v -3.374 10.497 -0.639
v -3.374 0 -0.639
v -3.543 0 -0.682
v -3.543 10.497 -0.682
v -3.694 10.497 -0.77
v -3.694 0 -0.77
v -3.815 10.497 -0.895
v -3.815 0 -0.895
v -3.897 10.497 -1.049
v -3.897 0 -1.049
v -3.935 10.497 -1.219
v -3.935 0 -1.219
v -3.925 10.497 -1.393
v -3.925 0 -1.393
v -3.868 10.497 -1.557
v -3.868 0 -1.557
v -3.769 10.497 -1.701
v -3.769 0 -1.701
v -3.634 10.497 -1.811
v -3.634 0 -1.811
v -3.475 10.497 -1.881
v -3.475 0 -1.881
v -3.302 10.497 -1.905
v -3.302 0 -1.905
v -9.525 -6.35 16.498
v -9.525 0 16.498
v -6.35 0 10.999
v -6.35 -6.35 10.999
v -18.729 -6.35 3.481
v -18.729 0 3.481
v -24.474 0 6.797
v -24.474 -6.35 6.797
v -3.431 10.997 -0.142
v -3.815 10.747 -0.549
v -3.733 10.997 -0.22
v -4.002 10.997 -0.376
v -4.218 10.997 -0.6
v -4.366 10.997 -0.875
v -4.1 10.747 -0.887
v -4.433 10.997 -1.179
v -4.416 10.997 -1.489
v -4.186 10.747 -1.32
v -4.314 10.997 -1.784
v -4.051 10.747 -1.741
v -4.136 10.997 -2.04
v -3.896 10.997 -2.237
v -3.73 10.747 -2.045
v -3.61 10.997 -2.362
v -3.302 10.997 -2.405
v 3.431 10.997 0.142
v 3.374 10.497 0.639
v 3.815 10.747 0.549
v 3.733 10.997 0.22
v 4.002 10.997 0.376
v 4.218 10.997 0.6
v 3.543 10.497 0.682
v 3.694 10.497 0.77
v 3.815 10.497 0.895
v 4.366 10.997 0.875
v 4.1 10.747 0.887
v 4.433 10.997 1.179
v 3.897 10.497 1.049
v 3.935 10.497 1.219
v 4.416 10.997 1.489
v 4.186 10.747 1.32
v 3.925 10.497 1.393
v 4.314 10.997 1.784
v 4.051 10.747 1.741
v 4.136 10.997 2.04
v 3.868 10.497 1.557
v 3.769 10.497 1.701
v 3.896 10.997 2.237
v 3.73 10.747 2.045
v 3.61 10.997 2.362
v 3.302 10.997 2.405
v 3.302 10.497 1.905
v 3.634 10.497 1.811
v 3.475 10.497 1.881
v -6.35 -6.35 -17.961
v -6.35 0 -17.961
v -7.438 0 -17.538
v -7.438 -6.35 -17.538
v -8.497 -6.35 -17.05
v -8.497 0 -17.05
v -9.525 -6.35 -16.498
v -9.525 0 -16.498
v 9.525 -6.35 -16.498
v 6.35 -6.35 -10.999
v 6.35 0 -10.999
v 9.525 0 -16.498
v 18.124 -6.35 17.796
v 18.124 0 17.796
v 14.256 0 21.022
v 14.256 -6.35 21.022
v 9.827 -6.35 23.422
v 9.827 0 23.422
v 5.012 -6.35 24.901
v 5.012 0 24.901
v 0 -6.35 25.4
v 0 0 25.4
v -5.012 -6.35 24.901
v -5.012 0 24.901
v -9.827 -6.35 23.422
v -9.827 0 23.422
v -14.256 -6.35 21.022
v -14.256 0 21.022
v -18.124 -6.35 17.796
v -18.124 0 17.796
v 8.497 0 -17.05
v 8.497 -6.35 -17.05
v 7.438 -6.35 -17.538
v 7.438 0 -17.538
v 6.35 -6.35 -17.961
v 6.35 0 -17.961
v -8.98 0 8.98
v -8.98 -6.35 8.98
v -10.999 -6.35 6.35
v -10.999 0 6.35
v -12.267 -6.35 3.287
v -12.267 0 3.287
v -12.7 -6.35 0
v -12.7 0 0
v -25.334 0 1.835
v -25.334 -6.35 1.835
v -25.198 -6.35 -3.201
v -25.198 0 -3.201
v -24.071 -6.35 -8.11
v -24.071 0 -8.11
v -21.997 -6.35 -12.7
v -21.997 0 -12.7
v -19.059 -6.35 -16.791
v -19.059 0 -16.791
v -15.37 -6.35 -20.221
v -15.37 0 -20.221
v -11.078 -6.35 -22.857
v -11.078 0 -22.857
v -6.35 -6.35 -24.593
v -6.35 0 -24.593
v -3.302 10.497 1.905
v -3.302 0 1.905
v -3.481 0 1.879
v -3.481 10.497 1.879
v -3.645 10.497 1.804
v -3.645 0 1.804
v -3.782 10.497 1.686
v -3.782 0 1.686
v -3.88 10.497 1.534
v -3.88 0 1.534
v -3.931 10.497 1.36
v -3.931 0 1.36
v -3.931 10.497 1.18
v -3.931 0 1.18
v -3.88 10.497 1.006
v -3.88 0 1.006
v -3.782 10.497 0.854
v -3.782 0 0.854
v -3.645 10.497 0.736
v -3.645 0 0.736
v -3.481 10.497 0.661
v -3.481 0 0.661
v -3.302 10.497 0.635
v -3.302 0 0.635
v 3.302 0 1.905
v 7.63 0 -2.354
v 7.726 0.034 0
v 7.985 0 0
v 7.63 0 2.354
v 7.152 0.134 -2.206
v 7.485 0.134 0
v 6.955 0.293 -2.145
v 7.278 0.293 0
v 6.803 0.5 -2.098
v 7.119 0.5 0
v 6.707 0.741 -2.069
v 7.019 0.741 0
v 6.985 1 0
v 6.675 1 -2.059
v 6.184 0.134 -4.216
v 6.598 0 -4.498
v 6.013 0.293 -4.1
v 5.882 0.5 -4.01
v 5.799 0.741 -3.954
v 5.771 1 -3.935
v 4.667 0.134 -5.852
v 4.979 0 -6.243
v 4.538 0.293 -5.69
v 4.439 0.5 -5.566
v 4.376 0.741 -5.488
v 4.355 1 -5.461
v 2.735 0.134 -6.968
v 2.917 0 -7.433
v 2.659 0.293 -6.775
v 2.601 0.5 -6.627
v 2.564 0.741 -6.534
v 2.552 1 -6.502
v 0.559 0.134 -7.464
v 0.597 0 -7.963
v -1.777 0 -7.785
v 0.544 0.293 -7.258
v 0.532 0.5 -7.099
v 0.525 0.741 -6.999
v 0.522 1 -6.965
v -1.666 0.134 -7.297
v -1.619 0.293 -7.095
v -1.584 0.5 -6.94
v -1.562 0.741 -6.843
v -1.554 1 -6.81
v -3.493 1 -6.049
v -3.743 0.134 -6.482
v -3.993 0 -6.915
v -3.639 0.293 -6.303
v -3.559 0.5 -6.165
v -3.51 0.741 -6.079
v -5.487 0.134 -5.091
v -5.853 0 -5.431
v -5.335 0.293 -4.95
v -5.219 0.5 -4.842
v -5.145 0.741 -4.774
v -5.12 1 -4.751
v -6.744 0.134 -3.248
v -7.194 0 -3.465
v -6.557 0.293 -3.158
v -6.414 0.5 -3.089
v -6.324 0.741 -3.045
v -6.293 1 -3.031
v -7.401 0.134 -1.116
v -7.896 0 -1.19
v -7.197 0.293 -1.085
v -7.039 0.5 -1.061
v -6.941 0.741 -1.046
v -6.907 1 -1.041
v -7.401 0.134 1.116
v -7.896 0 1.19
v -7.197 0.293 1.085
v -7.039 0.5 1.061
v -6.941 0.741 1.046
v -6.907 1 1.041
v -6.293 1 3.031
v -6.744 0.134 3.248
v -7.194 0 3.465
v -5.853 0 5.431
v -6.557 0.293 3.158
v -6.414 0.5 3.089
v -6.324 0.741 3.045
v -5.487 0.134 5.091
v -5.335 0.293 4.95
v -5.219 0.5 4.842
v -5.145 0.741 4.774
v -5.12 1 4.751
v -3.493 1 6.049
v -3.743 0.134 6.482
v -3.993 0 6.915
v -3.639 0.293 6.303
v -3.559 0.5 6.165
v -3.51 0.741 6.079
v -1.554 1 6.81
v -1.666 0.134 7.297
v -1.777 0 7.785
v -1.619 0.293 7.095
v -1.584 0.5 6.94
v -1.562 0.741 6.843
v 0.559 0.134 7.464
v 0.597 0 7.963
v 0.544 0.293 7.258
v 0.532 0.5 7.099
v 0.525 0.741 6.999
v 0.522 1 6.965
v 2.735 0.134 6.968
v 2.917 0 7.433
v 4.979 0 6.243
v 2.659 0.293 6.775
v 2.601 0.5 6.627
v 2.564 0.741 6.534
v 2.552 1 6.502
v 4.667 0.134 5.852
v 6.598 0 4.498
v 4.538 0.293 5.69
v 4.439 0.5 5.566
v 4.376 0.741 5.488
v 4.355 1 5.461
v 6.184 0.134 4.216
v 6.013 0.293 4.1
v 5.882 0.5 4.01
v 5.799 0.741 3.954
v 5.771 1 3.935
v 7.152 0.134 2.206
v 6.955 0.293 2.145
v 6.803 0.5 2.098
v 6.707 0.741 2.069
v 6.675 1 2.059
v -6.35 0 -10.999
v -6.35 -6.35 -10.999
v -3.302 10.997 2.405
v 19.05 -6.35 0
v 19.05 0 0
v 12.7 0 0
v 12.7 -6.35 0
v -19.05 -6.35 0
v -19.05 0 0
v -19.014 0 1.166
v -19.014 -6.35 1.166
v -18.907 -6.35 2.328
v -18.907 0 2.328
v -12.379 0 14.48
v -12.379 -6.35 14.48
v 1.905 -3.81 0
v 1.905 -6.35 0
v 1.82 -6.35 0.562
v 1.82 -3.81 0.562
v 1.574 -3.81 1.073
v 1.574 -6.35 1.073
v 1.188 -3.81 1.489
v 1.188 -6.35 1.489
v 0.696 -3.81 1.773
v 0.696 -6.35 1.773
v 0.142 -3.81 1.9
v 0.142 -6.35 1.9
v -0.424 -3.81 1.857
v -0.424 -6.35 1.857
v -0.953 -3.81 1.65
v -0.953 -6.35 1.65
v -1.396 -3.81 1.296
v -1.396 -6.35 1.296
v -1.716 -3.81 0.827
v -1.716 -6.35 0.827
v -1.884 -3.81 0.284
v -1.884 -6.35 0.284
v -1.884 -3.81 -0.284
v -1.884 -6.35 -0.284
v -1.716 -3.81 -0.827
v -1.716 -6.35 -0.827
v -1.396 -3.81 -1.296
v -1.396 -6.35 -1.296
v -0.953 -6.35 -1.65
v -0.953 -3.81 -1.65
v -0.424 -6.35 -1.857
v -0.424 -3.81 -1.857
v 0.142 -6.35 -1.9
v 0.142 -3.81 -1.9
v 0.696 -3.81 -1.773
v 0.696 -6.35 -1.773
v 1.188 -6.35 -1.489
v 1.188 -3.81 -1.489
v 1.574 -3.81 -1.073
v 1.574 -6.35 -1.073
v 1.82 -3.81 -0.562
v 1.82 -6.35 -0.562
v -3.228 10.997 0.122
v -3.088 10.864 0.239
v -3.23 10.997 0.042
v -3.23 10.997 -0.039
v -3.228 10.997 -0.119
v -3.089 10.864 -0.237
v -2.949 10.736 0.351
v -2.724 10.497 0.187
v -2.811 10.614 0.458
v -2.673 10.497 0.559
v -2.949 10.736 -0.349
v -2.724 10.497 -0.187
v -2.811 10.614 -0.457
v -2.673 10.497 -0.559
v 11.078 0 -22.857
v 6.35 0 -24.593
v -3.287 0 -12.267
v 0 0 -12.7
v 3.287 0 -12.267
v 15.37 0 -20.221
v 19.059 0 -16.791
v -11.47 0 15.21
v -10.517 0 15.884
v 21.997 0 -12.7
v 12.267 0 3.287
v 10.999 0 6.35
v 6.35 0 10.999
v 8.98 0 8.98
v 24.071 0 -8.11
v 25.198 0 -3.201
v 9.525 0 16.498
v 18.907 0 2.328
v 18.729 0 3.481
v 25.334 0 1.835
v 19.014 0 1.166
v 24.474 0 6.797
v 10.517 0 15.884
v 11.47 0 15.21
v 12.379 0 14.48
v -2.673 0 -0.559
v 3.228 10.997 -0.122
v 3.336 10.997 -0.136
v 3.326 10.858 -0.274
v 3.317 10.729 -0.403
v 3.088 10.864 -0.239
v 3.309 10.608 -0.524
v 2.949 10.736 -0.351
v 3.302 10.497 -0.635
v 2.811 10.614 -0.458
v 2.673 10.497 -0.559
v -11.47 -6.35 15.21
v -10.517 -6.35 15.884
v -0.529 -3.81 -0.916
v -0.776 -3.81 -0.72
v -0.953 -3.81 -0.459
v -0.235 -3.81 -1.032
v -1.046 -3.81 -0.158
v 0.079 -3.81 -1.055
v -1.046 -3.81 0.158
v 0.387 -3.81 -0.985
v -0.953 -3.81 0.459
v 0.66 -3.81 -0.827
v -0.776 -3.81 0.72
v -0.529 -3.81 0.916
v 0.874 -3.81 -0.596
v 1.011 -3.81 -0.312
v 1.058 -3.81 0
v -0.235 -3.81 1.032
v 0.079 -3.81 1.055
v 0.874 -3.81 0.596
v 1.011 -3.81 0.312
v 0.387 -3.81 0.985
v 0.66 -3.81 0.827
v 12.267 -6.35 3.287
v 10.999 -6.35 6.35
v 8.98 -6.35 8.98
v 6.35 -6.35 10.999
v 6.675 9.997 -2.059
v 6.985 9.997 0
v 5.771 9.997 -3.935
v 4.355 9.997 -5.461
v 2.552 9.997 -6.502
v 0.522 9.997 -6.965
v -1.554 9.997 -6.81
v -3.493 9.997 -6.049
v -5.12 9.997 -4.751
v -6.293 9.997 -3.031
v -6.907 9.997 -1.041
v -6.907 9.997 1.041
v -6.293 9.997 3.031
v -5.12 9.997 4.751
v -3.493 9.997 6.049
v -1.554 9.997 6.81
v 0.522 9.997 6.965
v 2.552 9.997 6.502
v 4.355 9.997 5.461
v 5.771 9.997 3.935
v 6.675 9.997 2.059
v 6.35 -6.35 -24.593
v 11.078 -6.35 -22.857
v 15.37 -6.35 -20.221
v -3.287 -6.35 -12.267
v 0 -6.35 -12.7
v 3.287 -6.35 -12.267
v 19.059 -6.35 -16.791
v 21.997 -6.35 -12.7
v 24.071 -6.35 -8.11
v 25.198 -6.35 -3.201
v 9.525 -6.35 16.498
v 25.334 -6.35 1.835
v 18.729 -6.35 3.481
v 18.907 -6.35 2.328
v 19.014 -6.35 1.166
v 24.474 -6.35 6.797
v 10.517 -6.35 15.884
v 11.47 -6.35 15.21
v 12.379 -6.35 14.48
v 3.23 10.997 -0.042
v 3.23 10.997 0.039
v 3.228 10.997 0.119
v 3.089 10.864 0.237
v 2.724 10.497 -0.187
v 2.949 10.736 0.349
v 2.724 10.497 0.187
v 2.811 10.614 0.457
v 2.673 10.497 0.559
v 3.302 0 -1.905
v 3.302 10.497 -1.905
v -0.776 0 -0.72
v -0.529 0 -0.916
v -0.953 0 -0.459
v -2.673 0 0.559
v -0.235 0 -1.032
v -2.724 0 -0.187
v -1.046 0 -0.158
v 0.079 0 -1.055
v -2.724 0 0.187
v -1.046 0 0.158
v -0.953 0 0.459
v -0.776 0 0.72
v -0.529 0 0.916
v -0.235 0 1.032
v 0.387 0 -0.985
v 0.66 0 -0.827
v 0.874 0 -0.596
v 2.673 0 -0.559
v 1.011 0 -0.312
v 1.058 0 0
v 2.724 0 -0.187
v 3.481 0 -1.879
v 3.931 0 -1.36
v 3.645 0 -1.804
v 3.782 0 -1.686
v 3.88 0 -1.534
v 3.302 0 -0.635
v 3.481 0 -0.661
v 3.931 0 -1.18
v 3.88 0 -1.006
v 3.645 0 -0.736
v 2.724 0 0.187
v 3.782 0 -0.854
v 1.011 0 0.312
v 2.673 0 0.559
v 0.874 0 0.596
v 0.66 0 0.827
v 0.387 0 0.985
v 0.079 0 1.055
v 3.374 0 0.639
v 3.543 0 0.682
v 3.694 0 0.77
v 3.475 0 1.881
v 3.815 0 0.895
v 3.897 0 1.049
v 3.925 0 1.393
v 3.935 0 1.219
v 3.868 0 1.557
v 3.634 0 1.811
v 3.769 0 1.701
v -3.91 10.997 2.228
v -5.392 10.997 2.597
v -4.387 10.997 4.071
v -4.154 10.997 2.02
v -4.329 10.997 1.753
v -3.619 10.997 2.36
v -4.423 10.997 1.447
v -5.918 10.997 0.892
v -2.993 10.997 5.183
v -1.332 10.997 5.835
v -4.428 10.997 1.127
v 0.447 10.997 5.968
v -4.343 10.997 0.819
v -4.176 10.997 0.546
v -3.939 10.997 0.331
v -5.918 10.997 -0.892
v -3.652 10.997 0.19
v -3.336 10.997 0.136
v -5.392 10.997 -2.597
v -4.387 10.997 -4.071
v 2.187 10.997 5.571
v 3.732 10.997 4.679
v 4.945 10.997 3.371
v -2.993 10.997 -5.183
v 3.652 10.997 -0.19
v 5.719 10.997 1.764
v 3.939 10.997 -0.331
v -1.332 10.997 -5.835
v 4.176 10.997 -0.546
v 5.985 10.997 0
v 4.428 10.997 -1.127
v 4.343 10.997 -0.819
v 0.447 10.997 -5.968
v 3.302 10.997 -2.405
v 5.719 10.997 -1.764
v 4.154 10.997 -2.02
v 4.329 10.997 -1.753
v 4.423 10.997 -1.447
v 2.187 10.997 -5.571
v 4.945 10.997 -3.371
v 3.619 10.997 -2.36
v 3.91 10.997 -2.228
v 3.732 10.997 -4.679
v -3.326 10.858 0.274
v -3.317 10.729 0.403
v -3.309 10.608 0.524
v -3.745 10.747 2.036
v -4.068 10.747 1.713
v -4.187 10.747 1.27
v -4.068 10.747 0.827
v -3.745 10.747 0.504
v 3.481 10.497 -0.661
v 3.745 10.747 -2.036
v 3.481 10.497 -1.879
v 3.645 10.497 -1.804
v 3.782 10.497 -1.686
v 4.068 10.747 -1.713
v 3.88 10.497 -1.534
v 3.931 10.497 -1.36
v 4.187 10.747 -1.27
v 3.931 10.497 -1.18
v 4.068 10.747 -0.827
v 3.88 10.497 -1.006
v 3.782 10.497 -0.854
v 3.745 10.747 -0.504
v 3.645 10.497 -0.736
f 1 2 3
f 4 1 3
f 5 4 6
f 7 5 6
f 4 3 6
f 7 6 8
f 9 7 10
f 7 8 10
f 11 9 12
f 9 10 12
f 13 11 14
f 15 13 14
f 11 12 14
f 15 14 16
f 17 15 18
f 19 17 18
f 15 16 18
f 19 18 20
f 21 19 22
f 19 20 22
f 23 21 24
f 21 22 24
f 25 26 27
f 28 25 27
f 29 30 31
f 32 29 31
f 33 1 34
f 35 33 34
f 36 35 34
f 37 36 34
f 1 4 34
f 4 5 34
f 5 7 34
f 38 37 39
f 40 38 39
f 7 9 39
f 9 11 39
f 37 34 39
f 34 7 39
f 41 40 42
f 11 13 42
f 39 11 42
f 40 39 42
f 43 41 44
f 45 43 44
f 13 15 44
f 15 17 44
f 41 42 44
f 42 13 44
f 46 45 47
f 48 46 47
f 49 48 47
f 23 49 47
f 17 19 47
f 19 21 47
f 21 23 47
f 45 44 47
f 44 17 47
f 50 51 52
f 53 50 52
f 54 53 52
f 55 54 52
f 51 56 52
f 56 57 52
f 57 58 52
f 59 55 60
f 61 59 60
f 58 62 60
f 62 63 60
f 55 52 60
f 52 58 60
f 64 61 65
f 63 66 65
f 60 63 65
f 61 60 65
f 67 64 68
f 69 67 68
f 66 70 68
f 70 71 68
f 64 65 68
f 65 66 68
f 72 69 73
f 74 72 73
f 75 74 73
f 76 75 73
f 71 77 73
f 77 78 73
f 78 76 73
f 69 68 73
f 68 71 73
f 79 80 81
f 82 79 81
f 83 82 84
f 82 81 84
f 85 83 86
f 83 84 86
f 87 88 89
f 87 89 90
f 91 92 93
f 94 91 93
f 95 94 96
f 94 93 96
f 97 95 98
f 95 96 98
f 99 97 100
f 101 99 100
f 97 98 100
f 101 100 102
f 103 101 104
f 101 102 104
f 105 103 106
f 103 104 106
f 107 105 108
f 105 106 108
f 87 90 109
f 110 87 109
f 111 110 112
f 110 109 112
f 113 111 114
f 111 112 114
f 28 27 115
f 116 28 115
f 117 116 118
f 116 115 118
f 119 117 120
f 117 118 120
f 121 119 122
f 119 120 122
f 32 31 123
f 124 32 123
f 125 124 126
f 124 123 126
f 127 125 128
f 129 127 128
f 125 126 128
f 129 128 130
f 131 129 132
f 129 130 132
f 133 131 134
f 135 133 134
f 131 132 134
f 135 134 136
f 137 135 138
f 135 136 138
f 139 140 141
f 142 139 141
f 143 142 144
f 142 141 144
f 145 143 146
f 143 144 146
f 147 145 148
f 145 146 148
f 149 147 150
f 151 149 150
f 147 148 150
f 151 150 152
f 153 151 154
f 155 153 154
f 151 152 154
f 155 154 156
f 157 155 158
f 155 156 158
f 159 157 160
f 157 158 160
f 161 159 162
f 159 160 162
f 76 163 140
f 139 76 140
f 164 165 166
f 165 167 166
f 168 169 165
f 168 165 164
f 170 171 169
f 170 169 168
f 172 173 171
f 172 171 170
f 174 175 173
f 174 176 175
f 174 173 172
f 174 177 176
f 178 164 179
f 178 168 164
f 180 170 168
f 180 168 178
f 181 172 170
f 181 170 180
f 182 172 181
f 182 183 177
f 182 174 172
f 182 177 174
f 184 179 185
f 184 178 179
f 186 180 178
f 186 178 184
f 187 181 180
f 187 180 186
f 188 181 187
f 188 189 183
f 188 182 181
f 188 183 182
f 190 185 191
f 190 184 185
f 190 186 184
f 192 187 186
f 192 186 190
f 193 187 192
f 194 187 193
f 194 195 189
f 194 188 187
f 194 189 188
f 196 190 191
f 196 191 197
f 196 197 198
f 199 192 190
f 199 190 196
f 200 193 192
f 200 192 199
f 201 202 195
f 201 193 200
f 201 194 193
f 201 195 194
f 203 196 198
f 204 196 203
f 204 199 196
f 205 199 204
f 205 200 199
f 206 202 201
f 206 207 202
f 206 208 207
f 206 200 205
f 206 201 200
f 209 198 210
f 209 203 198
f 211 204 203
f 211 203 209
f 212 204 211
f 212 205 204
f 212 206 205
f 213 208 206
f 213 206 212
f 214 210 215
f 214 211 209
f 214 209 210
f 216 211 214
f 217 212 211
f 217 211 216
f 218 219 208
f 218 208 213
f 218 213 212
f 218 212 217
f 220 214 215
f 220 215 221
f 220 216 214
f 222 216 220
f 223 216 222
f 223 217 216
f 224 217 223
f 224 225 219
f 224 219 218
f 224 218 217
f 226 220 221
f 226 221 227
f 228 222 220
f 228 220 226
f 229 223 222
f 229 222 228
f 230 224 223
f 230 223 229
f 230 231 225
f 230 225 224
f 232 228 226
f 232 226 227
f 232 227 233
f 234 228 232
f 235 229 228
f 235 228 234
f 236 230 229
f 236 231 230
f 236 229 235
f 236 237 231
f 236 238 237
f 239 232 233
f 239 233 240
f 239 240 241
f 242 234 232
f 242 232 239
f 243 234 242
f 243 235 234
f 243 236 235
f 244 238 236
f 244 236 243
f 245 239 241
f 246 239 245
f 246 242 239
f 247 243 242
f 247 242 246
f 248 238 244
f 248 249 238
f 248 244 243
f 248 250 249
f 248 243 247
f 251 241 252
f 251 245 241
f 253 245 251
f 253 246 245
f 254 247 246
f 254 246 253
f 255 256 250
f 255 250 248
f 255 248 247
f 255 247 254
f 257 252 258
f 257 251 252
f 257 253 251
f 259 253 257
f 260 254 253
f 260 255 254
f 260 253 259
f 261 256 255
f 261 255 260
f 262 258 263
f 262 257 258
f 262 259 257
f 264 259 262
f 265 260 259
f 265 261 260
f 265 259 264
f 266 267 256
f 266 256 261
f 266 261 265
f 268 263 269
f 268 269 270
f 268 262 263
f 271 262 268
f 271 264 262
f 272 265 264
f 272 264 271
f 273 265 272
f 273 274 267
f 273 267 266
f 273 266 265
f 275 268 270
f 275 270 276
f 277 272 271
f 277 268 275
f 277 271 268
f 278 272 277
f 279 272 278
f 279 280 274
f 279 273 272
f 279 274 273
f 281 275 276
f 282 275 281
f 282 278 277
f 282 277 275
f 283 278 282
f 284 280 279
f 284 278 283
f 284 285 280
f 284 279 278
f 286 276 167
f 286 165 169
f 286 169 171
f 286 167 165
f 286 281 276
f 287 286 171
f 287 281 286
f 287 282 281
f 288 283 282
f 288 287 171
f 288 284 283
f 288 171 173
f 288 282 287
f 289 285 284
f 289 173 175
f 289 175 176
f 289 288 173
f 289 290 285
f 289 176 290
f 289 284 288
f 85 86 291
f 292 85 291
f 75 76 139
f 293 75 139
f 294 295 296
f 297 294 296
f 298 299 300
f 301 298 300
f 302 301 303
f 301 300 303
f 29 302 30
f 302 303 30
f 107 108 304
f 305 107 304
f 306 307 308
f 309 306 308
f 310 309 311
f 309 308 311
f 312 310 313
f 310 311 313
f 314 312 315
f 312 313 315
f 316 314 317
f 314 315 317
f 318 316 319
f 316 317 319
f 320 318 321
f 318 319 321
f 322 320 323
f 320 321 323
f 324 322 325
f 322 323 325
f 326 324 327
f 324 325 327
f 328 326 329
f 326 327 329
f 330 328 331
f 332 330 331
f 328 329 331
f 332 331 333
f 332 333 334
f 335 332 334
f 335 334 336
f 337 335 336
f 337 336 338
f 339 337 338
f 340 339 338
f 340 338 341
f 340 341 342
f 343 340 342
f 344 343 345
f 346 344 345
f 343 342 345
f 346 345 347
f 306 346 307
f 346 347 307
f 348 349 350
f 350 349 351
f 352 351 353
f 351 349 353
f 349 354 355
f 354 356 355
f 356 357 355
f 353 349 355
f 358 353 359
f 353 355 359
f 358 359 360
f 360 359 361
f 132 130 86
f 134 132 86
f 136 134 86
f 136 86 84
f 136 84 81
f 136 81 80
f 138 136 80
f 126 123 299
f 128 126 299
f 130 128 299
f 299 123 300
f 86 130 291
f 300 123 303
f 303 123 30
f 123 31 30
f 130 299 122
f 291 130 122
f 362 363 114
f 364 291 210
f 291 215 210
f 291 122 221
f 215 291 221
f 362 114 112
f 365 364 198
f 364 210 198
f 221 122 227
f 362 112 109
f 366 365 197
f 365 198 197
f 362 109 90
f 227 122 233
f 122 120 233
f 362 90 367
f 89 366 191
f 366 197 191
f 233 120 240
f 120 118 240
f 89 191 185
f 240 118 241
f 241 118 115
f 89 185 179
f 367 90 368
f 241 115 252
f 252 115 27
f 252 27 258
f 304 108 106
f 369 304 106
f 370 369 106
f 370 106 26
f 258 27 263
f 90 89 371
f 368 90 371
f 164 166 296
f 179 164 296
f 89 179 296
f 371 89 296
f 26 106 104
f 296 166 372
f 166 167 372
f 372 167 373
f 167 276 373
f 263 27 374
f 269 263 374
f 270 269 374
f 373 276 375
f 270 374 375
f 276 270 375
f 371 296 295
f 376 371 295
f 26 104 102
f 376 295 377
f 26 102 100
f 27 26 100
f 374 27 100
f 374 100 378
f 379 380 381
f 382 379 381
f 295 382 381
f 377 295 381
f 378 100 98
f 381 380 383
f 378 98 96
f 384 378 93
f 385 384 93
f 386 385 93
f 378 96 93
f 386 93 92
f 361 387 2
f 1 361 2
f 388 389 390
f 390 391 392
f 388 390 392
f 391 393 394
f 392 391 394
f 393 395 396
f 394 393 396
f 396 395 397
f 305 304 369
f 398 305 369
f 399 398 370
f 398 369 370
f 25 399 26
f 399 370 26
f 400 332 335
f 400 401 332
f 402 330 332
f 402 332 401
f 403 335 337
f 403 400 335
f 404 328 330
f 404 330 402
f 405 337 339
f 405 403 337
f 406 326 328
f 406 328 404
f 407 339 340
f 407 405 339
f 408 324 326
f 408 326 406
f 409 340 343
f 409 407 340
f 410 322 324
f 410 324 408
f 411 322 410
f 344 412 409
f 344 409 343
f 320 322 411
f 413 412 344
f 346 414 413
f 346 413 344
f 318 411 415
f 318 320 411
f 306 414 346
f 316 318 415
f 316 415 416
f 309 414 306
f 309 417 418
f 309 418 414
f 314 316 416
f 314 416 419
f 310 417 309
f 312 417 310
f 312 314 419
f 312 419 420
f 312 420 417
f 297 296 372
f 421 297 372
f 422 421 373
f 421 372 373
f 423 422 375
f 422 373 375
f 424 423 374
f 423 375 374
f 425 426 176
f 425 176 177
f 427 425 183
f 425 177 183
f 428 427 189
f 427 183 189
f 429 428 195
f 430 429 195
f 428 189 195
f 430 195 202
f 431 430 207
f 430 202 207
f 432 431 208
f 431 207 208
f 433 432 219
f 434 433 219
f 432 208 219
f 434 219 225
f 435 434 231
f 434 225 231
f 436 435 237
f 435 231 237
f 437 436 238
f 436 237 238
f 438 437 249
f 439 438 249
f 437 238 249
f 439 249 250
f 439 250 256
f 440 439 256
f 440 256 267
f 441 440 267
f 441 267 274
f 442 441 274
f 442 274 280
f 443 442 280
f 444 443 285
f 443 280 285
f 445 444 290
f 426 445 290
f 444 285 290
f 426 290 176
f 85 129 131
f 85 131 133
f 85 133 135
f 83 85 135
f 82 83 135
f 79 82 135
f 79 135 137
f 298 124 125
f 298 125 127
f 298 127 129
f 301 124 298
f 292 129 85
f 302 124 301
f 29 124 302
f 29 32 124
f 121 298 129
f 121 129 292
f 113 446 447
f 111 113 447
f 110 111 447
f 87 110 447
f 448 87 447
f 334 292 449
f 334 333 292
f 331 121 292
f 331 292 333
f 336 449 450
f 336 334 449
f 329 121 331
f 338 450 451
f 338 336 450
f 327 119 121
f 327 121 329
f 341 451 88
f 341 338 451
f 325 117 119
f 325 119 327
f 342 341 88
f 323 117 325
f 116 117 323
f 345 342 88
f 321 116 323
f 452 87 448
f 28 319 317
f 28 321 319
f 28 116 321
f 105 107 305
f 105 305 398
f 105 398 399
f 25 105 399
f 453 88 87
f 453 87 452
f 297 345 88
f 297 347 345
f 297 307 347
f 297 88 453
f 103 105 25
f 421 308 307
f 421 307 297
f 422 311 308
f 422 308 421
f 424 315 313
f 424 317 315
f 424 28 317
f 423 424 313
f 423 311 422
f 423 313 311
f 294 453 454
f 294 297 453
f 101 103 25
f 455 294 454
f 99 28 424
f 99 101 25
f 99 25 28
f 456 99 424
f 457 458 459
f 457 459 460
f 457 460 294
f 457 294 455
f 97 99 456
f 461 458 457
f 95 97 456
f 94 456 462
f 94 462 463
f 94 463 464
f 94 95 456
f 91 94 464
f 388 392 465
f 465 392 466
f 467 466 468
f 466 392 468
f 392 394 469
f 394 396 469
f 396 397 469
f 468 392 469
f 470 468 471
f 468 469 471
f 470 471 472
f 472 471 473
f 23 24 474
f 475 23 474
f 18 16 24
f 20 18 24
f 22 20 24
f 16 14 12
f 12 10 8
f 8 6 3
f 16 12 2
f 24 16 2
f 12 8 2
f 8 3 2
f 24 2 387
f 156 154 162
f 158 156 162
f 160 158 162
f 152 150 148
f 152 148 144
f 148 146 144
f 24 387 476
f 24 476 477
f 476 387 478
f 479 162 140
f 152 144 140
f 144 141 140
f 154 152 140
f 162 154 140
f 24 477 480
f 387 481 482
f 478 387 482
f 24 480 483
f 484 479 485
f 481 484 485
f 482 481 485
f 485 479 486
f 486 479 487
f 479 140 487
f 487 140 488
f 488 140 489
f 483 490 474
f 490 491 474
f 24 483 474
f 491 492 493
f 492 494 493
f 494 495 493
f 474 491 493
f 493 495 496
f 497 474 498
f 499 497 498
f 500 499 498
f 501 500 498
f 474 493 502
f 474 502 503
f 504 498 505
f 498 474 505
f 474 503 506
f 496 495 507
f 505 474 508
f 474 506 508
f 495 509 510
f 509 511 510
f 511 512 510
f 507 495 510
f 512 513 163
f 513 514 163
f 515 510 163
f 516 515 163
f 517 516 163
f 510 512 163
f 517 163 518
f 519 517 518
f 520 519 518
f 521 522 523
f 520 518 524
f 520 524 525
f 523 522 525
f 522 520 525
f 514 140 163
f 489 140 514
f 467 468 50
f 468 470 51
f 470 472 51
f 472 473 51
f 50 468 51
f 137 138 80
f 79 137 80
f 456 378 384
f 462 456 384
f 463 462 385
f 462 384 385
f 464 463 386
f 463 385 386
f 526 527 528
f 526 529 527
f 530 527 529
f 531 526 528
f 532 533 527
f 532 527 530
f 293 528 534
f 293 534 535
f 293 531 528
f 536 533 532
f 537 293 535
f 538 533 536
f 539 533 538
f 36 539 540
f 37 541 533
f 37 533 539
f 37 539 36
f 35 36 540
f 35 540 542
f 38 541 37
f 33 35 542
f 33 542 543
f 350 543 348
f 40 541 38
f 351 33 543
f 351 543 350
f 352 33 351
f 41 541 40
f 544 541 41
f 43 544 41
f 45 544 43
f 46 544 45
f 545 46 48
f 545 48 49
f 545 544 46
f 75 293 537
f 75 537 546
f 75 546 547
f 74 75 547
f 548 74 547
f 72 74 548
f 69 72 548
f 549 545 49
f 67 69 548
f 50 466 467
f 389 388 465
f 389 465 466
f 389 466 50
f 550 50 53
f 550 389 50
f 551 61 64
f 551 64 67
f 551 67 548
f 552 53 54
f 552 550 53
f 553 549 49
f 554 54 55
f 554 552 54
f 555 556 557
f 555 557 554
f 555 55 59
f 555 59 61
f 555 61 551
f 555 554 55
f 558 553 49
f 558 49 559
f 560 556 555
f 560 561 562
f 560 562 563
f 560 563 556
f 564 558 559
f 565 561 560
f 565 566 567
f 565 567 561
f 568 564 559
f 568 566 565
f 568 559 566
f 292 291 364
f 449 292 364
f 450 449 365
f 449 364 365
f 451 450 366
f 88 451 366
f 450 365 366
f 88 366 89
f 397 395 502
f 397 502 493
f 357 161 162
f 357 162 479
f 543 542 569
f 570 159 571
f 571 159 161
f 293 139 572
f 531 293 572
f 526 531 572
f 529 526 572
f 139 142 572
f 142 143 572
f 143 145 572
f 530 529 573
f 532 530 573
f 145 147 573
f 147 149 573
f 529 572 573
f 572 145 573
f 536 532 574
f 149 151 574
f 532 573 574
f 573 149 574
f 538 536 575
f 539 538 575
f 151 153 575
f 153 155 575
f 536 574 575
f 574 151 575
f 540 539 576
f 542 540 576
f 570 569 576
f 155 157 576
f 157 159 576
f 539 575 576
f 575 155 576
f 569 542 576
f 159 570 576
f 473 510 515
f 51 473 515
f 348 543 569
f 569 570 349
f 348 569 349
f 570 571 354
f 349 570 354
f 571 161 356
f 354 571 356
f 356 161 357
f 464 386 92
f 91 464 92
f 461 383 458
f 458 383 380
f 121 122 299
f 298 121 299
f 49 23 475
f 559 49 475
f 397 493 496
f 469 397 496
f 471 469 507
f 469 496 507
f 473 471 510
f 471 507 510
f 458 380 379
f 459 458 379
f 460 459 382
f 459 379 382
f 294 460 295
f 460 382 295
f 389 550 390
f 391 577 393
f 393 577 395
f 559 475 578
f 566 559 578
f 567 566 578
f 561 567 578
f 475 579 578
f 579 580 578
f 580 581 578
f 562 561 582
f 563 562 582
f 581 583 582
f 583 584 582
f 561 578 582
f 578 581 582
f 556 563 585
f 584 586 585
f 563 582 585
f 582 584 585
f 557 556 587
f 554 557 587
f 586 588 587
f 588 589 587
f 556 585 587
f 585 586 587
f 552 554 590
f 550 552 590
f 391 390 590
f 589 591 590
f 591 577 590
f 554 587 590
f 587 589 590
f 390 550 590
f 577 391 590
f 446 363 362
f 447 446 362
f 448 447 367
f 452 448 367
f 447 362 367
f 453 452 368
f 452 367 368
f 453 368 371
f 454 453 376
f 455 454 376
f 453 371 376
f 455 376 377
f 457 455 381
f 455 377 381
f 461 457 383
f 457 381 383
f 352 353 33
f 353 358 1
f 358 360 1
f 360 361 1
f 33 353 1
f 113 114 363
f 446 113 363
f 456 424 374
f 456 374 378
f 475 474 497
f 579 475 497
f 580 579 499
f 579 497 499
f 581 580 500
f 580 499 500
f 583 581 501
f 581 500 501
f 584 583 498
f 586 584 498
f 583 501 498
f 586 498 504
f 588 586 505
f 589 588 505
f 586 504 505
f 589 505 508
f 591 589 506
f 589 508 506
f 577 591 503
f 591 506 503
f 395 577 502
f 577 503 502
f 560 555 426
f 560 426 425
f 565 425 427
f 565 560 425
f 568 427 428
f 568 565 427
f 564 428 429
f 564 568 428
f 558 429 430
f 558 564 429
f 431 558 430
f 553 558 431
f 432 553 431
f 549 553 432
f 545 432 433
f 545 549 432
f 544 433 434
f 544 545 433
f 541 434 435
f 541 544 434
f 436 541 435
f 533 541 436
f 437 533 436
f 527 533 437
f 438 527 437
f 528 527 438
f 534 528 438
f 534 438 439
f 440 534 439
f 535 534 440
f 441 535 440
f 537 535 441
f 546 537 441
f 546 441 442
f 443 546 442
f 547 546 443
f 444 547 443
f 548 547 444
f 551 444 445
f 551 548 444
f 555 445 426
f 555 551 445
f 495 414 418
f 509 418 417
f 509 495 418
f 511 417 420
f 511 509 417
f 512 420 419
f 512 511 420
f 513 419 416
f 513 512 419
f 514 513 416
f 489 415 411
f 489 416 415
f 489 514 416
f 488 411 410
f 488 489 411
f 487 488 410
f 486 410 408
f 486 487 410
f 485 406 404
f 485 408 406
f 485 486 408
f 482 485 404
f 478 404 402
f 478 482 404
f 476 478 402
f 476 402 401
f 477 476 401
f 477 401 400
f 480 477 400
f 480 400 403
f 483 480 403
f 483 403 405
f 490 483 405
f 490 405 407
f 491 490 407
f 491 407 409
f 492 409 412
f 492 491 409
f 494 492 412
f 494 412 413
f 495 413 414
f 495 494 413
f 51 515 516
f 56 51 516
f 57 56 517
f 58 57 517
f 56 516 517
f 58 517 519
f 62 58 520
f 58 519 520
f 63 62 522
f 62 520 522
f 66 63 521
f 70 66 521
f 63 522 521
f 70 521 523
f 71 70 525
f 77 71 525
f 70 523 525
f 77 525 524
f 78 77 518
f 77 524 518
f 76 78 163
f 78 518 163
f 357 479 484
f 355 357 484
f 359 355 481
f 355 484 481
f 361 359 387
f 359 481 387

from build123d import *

# Parameters (mm, degrees)
SKETCH1_R           = 6.985
BOSS_EXTRUDE1_DEPTH = 10.9965998
CHAMFER5_SIZE       = 1
CHAMFER6_SIZE       = 0.500000016
SKETCH2_R           = 1.058078275
BOSS_EXTRUDE2_DEPTH = 6.35
FILLET1_R           = 1.000000032
SKETCH3_R           = 1.905
CUT_EXTRUDE1_DEPTH  = 2.54


with BuildPart() as part:
    # Sketch1 → Boss-Extrude1 (new body)
    with BuildSketch(Plane(origin=(0, 0, 0), x_dir=(1, 0, 0), z_dir=(0, 1, 0))):
        Circle(SKETCH1_R)
        with BuildLine():
            Line((-3.302, 1.905), (3.302, 1.905))
            ThreePointArc((3.302, 1.905), (3.937, 1.27), (3.302, 0.635))
            Line((3.302, 0.635), (2.67270889, 0.5588))
            ThreePointArc((2.67270889, 0.5588), (2.7305, 0), (2.67270889, -0.5588))
            Line((2.67270889, -0.5588), (3.374233059, -0.639121735))
            ThreePointArc((3.374233059, -0.639121735), (3.935968729, -1.30617528), (3.302, -1.905))
            Line((3.302, -1.905), (-3.302, -1.905))
            ThreePointArc((-3.302, -1.905), (-3.937, -1.27), (-3.302, -0.635))
            Line((-3.302, -0.635), (-2.67270889, -0.5588))
            ThreePointArc((-2.67270889, -0.5588), (-2.7305, 0), (-2.67270889, 0.5588))
            Line((-2.67270889, 0.5588), (-3.374233059, 0.639121735))
            ThreePointArc((-3.374233059, 0.639121735), (-3.935968729, 1.30617528), (-3.302, 1.905))
        make_face(mode=Mode.SUBTRACT)
    extrude(amount=BOSS_EXTRUDE1_DEPTH)

    # Chamfer5
    chamfer5_edges = [part.edges().sort_by_distance(p)[0] for p in [
        (-6.985, 10.9965998, 0),
    ]]
    chamfer(chamfer5_edges, length=CHAMFER5_SIZE)

    # Chamfer6
    chamfer6_edges = [part.edges().sort_by_distance(p)[0] for p in [
        (-2.7305, 10.9965998, 0),
        (-2.987354445, 10.9965998, 0.5969),
        (-3.937, 10.9965998, 1.27),
        (0, 10.9965998, 1.905),
        (3.935968729, 10.9965998, 1.30617528),
        (3.023470975, 10.9965998, 0.598960868),
        (2.7305, 10.9965998, 0),
        (2.987354445, 10.9965998, -0.5969),
        (3.937, 10.9965998, -1.27),
        (0, 10.9965998, -1.905),
        (-3.935968729, 10.9965998, -1.30617528),
        (-3.023470975, 10.9965998, -0.598960868),
    ]]
    chamfer(chamfer6_edges, length=CHAMFER6_SIZE)

    # Sketch2 → Boss-Extrude2 (add)
    with BuildSketch(Plane.XZ):
        with BuildLine():
            Line((-6.35, -24.593444248), (-6.35, -17.960512242))
            ThreePointArc((-6.35, -17.960512242), (-7.971122868, -17.302129933), (-9.525, -16.497783942))
            Line((-9.525, -16.497783942), (-6.35, -10.998522628))
            ThreePointArc((-6.35, -10.998522628), (0, -12.7), (6.35, -10.998522628))
            Line((6.35, -10.998522628), (9.525, -16.497783942))
            ThreePointArc((9.525, -16.497783942), (7.971122868, -17.302129933), (6.35, -17.960512242))
            Line((6.35, -17.960512242), (6.35, -24.593444248))
            ThreePointArc((6.35, -24.593444248), (21.997045256, -12.7), (24.473547486, 6.79746081))
            Line((24.473547486, 6.79746081), (18.729259867, 3.480994807))
            ThreePointArc((18.729259867, 3.480994807), (18.969645496, 1.747870067), (19.05, 0))
            Line((19.05, 0), (12.7, 0))
            ThreePointArc((12.7, 0), (10.998522628, 6.35), (6.35, 10.998522628))
            Line((6.35, 10.998522628), (9.525, 16.497783942))
            ThreePointArc((9.525, 16.497783942), (10.998522628, 15.554259867), (12.379259867, 14.479517435))
            Line((12.379259867, 14.479517435), (18.123547486, 17.795983438))
            ThreePointArc((18.123547486, 17.795983438), (0, 25.4), (-18.123547486, 17.795983438))
            Line((-18.123547486, 17.795983438), (-12.379259867, 14.479517435))
            ThreePointArc((-12.379259867, 14.479517435), (-10.998522628, 15.554259867), (-9.525, 16.497783942))
            Line((-9.525, 16.497783942), (-6.35, 10.998522628))
            ThreePointArc((-6.35, 10.998522628), (-10.998522628, 6.35), (-12.7, 0))
            Line((-12.7, 0), (-19.05, 0))
            ThreePointArc((-19.05, 0), (-18.969645496, 1.747870067), (-18.729259867, 3.480994807))
            Line((-18.729259867, 3.480994807), (-24.473547486, 6.79746081))
            ThreePointArc((-24.473547486, 6.79746081), (-21.997045256, -12.7), (-6.35, -24.593444248))
        make_face()
        Circle(SKETCH2_R, mode=Mode.SUBTRACT)
    extrude(amount=BOSS_EXTRUDE2_DEPTH)

    # Fillet1
    fillet1_edges = [part.edges().sort_by_distance(p)[0] for p in [
        (-6.985, 0, 0),
    ]]
    fillet(fillet1_edges, radius=FILLET1_R)

    # Sketch3 → Cut-Extrude1 (cut)
    with BuildSketch(Plane.XZ.offset(6.35)):
        Circle(SKETCH3_R)
    extrude(amount=-CUT_EXTRUDE1_DEPTH, mode=Mode.SUBTRACT)


solid = part.part
